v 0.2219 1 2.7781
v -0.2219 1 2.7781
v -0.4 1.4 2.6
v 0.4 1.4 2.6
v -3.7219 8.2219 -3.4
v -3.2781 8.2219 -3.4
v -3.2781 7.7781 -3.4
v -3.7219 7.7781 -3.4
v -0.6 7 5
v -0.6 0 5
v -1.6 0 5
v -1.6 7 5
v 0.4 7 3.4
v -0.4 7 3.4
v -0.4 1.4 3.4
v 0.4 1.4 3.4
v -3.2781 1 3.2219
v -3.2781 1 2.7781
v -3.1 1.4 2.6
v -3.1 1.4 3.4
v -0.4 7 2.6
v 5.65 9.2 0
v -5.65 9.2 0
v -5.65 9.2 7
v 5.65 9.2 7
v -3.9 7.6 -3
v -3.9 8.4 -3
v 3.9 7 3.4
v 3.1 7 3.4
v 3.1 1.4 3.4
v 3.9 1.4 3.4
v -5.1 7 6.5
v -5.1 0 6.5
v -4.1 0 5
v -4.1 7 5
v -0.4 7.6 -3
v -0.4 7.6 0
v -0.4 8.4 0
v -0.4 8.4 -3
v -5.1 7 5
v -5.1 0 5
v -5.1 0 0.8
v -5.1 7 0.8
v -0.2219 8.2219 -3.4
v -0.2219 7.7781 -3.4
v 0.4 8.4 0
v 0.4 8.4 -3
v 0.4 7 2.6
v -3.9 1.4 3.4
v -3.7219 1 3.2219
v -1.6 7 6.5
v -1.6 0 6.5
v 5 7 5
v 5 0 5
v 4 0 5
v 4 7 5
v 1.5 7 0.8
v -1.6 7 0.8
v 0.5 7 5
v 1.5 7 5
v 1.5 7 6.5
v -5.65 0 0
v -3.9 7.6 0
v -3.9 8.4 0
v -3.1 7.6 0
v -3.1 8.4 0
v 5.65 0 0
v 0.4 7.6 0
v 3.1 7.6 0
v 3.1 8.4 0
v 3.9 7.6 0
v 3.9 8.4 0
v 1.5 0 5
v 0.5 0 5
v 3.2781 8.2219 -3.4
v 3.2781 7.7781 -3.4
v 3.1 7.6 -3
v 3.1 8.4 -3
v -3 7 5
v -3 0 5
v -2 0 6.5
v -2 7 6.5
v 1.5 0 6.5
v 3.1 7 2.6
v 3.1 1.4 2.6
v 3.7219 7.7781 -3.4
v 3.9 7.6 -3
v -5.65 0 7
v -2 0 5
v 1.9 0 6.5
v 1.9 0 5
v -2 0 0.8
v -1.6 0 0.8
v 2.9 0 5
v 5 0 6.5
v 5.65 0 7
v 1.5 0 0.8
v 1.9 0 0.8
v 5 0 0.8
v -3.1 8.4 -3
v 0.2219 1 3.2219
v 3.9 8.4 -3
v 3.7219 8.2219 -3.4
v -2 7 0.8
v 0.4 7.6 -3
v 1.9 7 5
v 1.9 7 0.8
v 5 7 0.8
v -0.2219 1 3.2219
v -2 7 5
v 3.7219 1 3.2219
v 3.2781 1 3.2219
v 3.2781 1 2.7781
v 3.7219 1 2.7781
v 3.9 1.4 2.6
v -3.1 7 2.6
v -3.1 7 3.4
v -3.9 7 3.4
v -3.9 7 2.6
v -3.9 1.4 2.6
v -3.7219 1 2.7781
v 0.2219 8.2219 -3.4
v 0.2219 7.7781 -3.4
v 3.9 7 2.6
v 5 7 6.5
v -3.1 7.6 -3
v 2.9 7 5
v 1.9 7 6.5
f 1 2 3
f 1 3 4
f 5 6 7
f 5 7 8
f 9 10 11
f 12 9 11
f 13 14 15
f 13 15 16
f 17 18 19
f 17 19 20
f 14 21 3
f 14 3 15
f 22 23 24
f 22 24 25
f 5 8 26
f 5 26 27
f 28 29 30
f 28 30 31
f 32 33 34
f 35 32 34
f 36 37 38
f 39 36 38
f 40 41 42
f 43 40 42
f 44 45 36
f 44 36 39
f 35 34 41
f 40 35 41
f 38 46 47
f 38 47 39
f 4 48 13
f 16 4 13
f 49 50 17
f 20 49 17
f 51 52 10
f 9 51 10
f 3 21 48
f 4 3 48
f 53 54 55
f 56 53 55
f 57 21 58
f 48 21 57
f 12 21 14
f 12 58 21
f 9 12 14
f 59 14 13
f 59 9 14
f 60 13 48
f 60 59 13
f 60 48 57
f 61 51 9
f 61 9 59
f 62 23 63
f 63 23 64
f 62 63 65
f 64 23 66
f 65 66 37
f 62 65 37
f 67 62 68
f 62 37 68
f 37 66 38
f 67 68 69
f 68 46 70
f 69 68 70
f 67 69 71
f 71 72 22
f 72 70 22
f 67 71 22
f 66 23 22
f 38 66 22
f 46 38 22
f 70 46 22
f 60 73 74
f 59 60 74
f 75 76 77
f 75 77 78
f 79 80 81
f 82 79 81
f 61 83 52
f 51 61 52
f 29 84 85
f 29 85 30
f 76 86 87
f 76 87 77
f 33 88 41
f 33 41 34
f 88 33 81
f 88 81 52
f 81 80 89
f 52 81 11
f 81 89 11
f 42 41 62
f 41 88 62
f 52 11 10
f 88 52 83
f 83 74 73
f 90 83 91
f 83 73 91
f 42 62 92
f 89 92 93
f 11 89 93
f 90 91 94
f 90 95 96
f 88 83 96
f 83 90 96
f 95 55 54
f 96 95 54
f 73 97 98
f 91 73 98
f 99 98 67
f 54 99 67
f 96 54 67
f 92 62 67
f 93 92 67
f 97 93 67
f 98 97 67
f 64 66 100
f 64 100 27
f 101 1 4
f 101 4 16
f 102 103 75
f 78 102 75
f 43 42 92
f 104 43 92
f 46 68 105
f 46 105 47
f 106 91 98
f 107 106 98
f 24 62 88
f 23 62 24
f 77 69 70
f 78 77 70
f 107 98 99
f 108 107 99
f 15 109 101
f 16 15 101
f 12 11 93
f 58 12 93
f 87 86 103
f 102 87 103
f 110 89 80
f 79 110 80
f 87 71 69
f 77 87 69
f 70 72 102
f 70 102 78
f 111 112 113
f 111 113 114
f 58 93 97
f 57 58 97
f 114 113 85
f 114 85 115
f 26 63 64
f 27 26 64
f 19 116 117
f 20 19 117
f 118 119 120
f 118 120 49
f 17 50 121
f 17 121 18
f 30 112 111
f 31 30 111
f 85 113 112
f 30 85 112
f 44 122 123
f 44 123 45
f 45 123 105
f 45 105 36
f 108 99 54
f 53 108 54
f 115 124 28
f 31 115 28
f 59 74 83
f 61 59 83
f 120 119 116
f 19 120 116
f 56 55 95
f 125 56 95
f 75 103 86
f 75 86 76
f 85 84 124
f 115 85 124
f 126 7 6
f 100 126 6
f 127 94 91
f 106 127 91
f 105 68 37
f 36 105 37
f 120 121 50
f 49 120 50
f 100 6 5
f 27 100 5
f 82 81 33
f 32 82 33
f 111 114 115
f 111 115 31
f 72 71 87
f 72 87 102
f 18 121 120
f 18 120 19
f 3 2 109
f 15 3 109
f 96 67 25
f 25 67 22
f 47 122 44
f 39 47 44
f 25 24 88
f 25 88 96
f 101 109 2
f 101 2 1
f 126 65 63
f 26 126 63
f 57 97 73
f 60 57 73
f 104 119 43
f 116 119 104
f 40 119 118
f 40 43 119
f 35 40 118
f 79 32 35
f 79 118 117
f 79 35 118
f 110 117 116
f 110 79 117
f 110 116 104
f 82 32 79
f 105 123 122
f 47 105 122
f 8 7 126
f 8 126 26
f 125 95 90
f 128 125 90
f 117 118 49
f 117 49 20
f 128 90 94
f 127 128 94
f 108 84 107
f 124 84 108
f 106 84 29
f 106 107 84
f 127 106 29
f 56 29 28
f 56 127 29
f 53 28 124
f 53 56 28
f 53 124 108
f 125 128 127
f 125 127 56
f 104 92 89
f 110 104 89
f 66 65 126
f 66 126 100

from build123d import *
from OCP.BRepFilletAPI import BRepFilletAPI_MakeChamfer

# Parameters (mm, degrees)
SKETCH_1_W                          = 11.3
SKETCH_1_H                          = 9.2
EXTRUDE_1_DEPTH                     = 7
SKETCH_2_W                          = 0.8
SKETCH_2_H                          = 0.8
EXTRUDE_2_DEPTH                     = 3.4
CHAMFER_1_SIZE                      = 0.4
CHAMFER_1_SIZE2                     = 0.178091474
CUT_EXTRUDE_1_DEPTH                 = 7
PATTERN_LINEAR_1_COUNT              = 3
PATTERN_LINEAR_1_PITCH              = 3.5
CHAMFER_1_OF_PATTERN_LINEAR_1_SIZE  = 0.4
CHAMFER_1_OF_PATTERN_LINEAR_1_SIZE2 = 0.178091474
PATTERN_LINEAR_2_COUNT              = 3
PATTERN_LINEAR_2_PITCH              = 3.5
SKETCH_4_W                          = 0.8
SKETCH_4_H                          = 0.8
EXTRUDE_3_DEPTH                     = 6
CHAMFER_2_SIZE                      = 0.4
CHAMFER_2_SIZE2                     = 0.178091474
PATTERN_LINEAR_3_COUNT              = 3
PATTERN_LINEAR_3_PITCH              = 3.5
CHAMFER_2_OF_PATTERN_LINEAR_3_SIZE  = 0.4
CHAMFER_2_OF_PATTERN_LINEAR_3_SIZE2 = 0.178091474


with BuildPart() as part:
    # Эскиз1 → Бобышка-Вытянуть1 (new body)
    with BuildSketch(Plane.XY):
        with Locations((0, 4.6)):
            Rectangle(SKETCH_1_W, SKETCH_1_H)
    extrude(amount=EXTRUDE_1_DEPTH)

    # Эскиз2 → Бобышка-Вытянуть2 (add)
    with BuildSketch(Plane(origin=(0, 0, 0), x_dir=(-1, 0, 0), z_dir=(0, 0, -1))):
        with Locations((-3.5, 8)):
            Rectangle(SKETCH_2_W, SKETCH_2_H)
    extrude_2 = extrude(amount=EXTRUDE_2_DEPTH)

    # Фаска1: one chamfer whose edges measure the first distance from different faces: ONE call of the kernel's chamfer builder (chamfer() names one face for all edges)
    chamfer_1_edges_1 = [part.edges().sort_by_distance(p)[0] for p in [
        (3.1, 8, -3.4),
    ]]
    chamfer_1_side_1 = [part.faces().sort_by_distance(p)[0] for p in [
        (3.1, 8, -1.7),
    ]]
    chamfer_1_edges_2 = [part.edges().sort_by_distance(p)[0] for p in [
        (3.5, 8.4, -3.4),
    ]]
    chamfer_1_side_2 = [part.faces().sort_by_distance(p)[0] for p in [
        (3.5, 8.4, -1.7),
    ]]
    chamfer_1_edges_3 = [part.edges().sort_by_distance(p)[0] for p in [
        (3.9, 8, -3.4),
    ]]
    chamfer_1_side_3 = [part.faces().sort_by_distance(p)[0] for p in [
        (3.9, 8, -1.7),
    ]]
    chamfer_1_edges_4 = [part.edges().sort_by_distance(p)[0] for p in [
        (3.5, 7.6, -3.4),
    ]]
    chamfer_1_side_4 = [part.faces().sort_by_distance(p)[0] for p in [
        (3.5, 7.6, -1.7),
    ]]
    chamfer_1 = BRepFilletAPI_MakeChamfer(part.part.solid().wrapped)
    for e in chamfer_1_edges_1:
        chamfer_1.Add(CHAMFER_1_SIZE, CHAMFER_1_SIZE2, e.wrapped, chamfer_1_side_1[0].wrapped)  # the first distance lies on this face
    for e in chamfer_1_edges_2:
        chamfer_1.Add(CHAMFER_1_SIZE, CHAMFER_1_SIZE2, e.wrapped, chamfer_1_side_2[0].wrapped)  # the first distance lies on this face
    for e in chamfer_1_edges_3:
        chamfer_1.Add(CHAMFER_1_SIZE, CHAMFER_1_SIZE2, e.wrapped, chamfer_1_side_3[0].wrapped)  # the first distance lies on this face
    for e in chamfer_1_edges_4:
        chamfer_1.Add(CHAMFER_1_SIZE, CHAMFER_1_SIZE2, e.wrapped, chamfer_1_side_4[0].wrapped)  # the first distance lies on this face
    add(Compound.cast(chamfer_1.Shape()), mode=Mode.REPLACE)

    # Эскиз3 → Вырез-Вытянуть1 (cut)
    with BuildSketch(Plane.XZ):
        Polygon((1.9, 0.8), (5, 0.8), (5, 5), (4, 5), (5, 6.5), (1.9, 6.5), (2.9, 5), (1.9, 5), align=None)
    cut_extrude_1 = extrude(amount=-CUT_EXTRUDE_1_DEPTH, mode=Mode.SUBTRACT)

    # Линейный массив1: Бобышка-Вытянуть2 ×3
    with Locations(*[(-i * PATTERN_LINEAR_1_PITCH, 0, 0) for i in range(1, PATTERN_LINEAR_1_COUNT)]):
        add(extrude_2)

    # Фаска1 of Линейный массив1: one chamfer whose edges measure the first distance from different faces: ONE call of the kernel's chamfer builder (chamfer() names one face for all edges)
    chamfer_1_of_pattern_linear_1_edges_1 = [part.edges().sort_by_distance(p)[0] for p in [
        (-0.4, 8, -3.4),
    ]]
    chamfer_1_of_pattern_linear_1_side_1 = [part.faces().sort_by_distance(p)[0] for p in [
        (-0.4, 8, -1.7),
    ]]
    chamfer_1_of_pattern_linear_1_edges_2 = [part.edges().sort_by_distance(p)[0] for p in [
        (0, 8.4, -3.4),
    ]]
    chamfer_1_of_pattern_linear_1_side_2 = [part.faces().sort_by_distance(p)[0] for p in [
        (0, 8.4, -1.7),
    ]]
    chamfer_1_of_pattern_linear_1_edges_3 = [part.edges().sort_by_distance(p)[0] for p in [
        (0.4, 8, -3.4),
    ]]
    chamfer_1_of_pattern_linear_1_side_3 = [part.faces().sort_by_distance(p)[0] for p in [
        (0.4, 8, -1.7),
    ]]
    chamfer_1_of_pattern_linear_1_edges_4 = [part.edges().sort_by_distance(p)[0] for p in [
        (0, 7.6, -3.4),
    ]]
    chamfer_1_of_pattern_linear_1_side_4 = [part.faces().sort_by_distance(p)[0] for p in [
        (0, 7.6, -1.7),
    ]]
    chamfer_1_of_pattern_linear_1_edges_5 = [part.edges().sort_by_distance(p)[0] for p in [
        (-3.9, 8, -3.4),
    ]]
    chamfer_1_of_pattern_linear_1_side_5 = [part.faces().sort_by_distance(p)[0] for p in [
        (-3.9, 8, -1.7),
    ]]
    chamfer_1_of_pattern_linear_1_edges_6 = [part.edges().sort_by_distance(p)[0] for p in [
        (-3.5, 8.4, -3.4),
    ]]
    chamfer_1_of_pattern_linear_1_side_6 = [part.faces().sort_by_distance(p)[0] for p in [
        (-3.5, 8.4, -1.7),
    ]]
    chamfer_1_of_pattern_linear_1_edges_7 = [part.edges().sort_by_distance(p)[0] for p in [
        (-3.1, 8, -3.4),
    ]]
    chamfer_1_of_pattern_linear_1_side_7 = [part.faces().sort_by_distance(p)[0] for p in [
        (-3.1, 8, -1.7),
    ]]
    chamfer_1_of_pattern_linear_1_edges_8 = [part.edges().sort_by_distance(p)[0] for p in [
        (-3.5, 7.6, -3.4),
    ]]
    chamfer_1_of_pattern_linear_1_side_8 = [part.faces().sort_by_distance(p)[0] for p in [
        (-3.5, 7.6, -1.7),
    ]]
    chamfer_1_of_pattern_linear_1 = BRepFilletAPI_MakeChamfer(part.part.solid().wrapped)
    for e in chamfer_1_of_pattern_linear_1_edges_1:
        chamfer_1_of_pattern_linear_1.Add(CHAMFER_1_OF_PATTERN_LINEAR_1_SIZE, CHAMFER_1_OF_PATTERN_LINEAR_1_SIZE2, e.wrapped, chamfer_1_of_pattern_linear_1_side_1[0].wrapped)  # the first distance lies on this face
    for e in chamfer_1_of_pattern_linear_1_edges_2:
        chamfer_1_of_pattern_linear_1.Add(CHAMFER_1_OF_PATTERN_LINEAR_1_SIZE, CHAMFER_1_OF_PATTERN_LINEAR_1_SIZE2, e.wrapped, chamfer_1_of_pattern_linear_1_side_2[0].wrapped)  # the first distance lies on this face
    for e in chamfer_1_of_pattern_linear_1_edges_3:
        chamfer_1_of_pattern_linear_1.Add(CHAMFER_1_OF_PATTERN_LINEAR_1_SIZE, CHAMFER_1_OF_PATTERN_LINEAR_1_SIZE2, e.wrapped, chamfer_1_of_pattern_linear_1_side_3[0].wrapped)  # the first distance lies on this face
    for e in chamfer_1_of_pattern_linear_1_edges_4:
        chamfer_1_of_pattern_linear_1.Add(CHAMFER_1_OF_PATTERN_LINEAR_1_SIZE, CHAMFER_1_OF_PATTERN_LINEAR_1_SIZE2, e.wrapped, chamfer_1_of_pattern_linear_1_side_4[0].wrapped)  # the first distance lies on this face
    for e in chamfer_1_of_pattern_linear_1_edges_5:
        chamfer_1_of_pattern_linear_1.Add(CHAMFER_1_OF_PATTERN_LINEAR_1_SIZE, CHAMFER_1_OF_PATTERN_LINEAR_1_SIZE2, e.wrapped, chamfer_1_of_pattern_linear_1_side_5[0].wrapped)  # the first distance lies on this face
    for e in chamfer_1_of_pattern_linear_1_edges_6:
        chamfer_1_of_pattern_linear_1.Add(CHAMFER_1_OF_PATTERN_LINEAR_1_SIZE, CHAMFER_1_OF_PATTERN_LINEAR_1_SIZE2, e.wrapped, chamfer_1_of_pattern_linear_1_side_6[0].wrapped)  # the first distance lies on this face
    for e in chamfer_1_of_pattern_linear_1_edges_7:
        chamfer_1_of_pattern_linear_1.Add(CHAMFER_1_OF_PATTERN_LINEAR_1_SIZE, CHAMFER_1_OF_PATTERN_LINEAR_1_SIZE2, e.wrapped, chamfer_1_of_pattern_linear_1_side_7[0].wrapped)  # the first distance lies on this face
    for e in chamfer_1_of_pattern_linear_1_edges_8:
        chamfer_1_of_pattern_linear_1.Add(CHAMFER_1_OF_PATTERN_LINEAR_1_SIZE, CHAMFER_1_OF_PATTERN_LINEAR_1_SIZE2, e.wrapped, chamfer_1_of_pattern_linear_1_side_8[0].wrapped)  # the first distance lies on this face
    add(Compound.cast(chamfer_1_of_pattern_linear_1.Shape()), mode=Mode.REPLACE)

    # Линейный массив2: Вырез-Вытянуть1 ×3
    with Locations(*[(-i * PATTERN_LINEAR_2_PITCH, 0, 0) for i in range(1, PATTERN_LINEAR_2_COUNT)]):
        add(cut_extrude_1, mode=Mode.SUBTRACT)

    # Эскиз4 → Бобышка-Вытянуть3 (add)
    with BuildSketch(Plane.XZ.offset(-7)):
        with Locations((3.5, 3)):
            Rectangle(SKETCH_4_W, SKETCH_4_H)
    extrude_3 = extrude(amount=EXTRUDE_3_DEPTH)

    # Фаска2: one chamfer whose edges measure the first distance from different faces: ONE call of the kernel's chamfer builder (chamfer() names one face for all edges)
    chamfer_2_edges_1 = [part.edges().sort_by_distance(p)[0] for p in [
        (3.9, 1, 3),
    ]]
    chamfer_2_side_1 = [part.faces().sort_by_distance(p)[0] for p in [
        (3.9, 4, 3),
    ]]
    chamfer_2_edges_2 = [part.edges().sort_by_distance(p)[0] for p in [
        (3.5, 1, 3.4),
    ]]
    chamfer_2_side_2 = [part.faces().sort_by_distance(p)[0] for p in [
        (3.5, 4, 3.4),
    ]]
    chamfer_2_edges_3 = [part.edges().sort_by_distance(p)[0] for p in [
        (3.1, 1, 3),
    ]]
    chamfer_2_side_3 = [part.faces().sort_by_distance(p)[0] for p in [
        (3.1, 4, 3),
    ]]
    chamfer_2_edges_4 = [part.edges().sort_by_distance(p)[0] for p in [
        (3.5, 1, 2.6),
    ]]
    chamfer_2_side_4 = [part.faces().sort_by_distance(p)[0] for p in [
        (3.5, 4, 2.6),
    ]]
    chamfer_2 = BRepFilletAPI_MakeChamfer(part.part.solid().wrapped)
    for e in chamfer_2_edges_1:
        chamfer_2.Add(CHAMFER_2_SIZE, CHAMFER_2_SIZE2, e.wrapped, chamfer_2_side_1[0].wrapped)  # the first distance lies on this face
    for e in chamfer_2_edges_2:
        chamfer_2.Add(CHAMFER_2_SIZE, CHAMFER_2_SIZE2, e.wrapped, chamfer_2_side_2[0].wrapped)  # the first distance lies on this face
    for e in chamfer_2_edges_3:
        chamfer_2.Add(CHAMFER_2_SIZE, CHAMFER_2_SIZE2, e.wrapped, chamfer_2_side_3[0].wrapped)  # the first distance lies on this face
    for e in chamfer_2_edges_4:
        chamfer_2.Add(CHAMFER_2_SIZE, CHAMFER_2_SIZE2, e.wrapped, chamfer_2_side_4[0].wrapped)  # the first distance lies on this face
    add(Compound.cast(chamfer_2.Shape()), mode=Mode.REPLACE)

    # Линейный массив3: Бобышка-Вытянуть3 ×3
    with Locations(*[(-i * PATTERN_LINEAR_3_PITCH, 0, 0) for i in range(1, PATTERN_LINEAR_3_COUNT)]):
        add(extrude_3)

    # Фаска2 of Линейный массив3: one chamfer whose edges measure the first distance from different faces: ONE call of the kernel's chamfer builder (chamfer() names one face for all edges)
    chamfer_2_of_pattern_linear_3_edges_1 = [part.edges().sort_by_distance(p)[0] for p in [
        (0.4, 1, 3),
    ]]
    chamfer_2_of_pattern_linear_3_side_1 = [part.faces().sort_by_distance(p)[0] for p in [
        (0.4, 4, 3),
    ]]
    chamfer_2_of_pattern_linear_3_edges_2 = [part.edges().sort_by_distance(p)[0] for p in [
        (0, 1, 3.4),
    ]]
    chamfer_2_of_pattern_linear_3_side_2 = [part.faces().sort_by_distance(p)[0] for p in [
        (0, 4, 3.4),
    ]]
    chamfer_2_of_pattern_linear_3_edges_3 = [part.edges().sort_by_distance(p)[0] for p in [
        (-0.4, 1, 3),
    ]]
    chamfer_2_of_pattern_linear_3_side_3 = [part.faces().sort_by_distance(p)[0] for p in [
        (-0.4, 4, 3),
    ]]
    chamfer_2_of_pattern_linear_3_edges_4 = [part.edges().sort_by_distance(p)[0] for p in [
        (0, 1, 2.6),
    ]]
    chamfer_2_of_pattern_linear_3_side_4 = [part.faces().sort_by_distance(p)[0] for p in [
        (0, 4, 2.6),
    ]]
    chamfer_2_of_pattern_linear_3_edges_5 = [part.edges().sort_by_distance(p)[0] for p in [
        (-3.1, 1, 3),
    ]]
    chamfer_2_of_pattern_linear_3_side_5 = [part.faces().sort_by_distance(p)[0] for p in [
        (-3.1, 4, 3),
    ]]
    chamfer_2_of_pattern_linear_3_edges_6 = [part.edges().sort_by_distance(p)[0] for p in [
        (-3.5, 1, 3.4),
    ]]
    chamfer_2_of_pattern_linear_3_side_6 = [part.faces().sort_by_distance(p)[0] for p in [
        (-3.5, 4, 3.4),
    ]]
    chamfer_2_of_pattern_linear_3_edges_7 = [part.edges().sort_by_distance(p)[0] for p in [
        (-3.9, 1, 3),
    ]]
    chamfer_2_of_pattern_linear_3_side_7 = [part.faces().sort_by_distance(p)[0] for p in [
        (-3.9, 4, 3),
    ]]
    chamfer_2_of_pattern_linear_3_edges_8 = [part.edges().sort_by_distance(p)[0] for p in [
        (-3.5, 1, 2.6),
    ]]
    chamfer_2_of_pattern_linear_3_side_8 = [part.faces().sort_by_distance(p)[0] for p in [
        (-3.5, 4, 2.6),
    ]]
    chamfer_2_of_pattern_linear_3 = BRepFilletAPI_MakeChamfer(part.part.solid().wrapped)
    for e in chamfer_2_of_pattern_linear_3_edges_1:
        chamfer_2_of_pattern_linear_3.Add(CHAMFER_2_OF_PATTERN_LINEAR_3_SIZE, CHAMFER_2_OF_PATTERN_LINEAR_3_SIZE2, e.wrapped, chamfer_2_of_pattern_linear_3_side_1[0].wrapped)  # the first distance lies on this face
    for e in chamfer_2_of_pattern_linear_3_edges_2:
        chamfer_2_of_pattern_linear_3.Add(CHAMFER_2_OF_PATTERN_LINEAR_3_SIZE, CHAMFER_2_OF_PATTERN_LINEAR_3_SIZE2, e.wrapped, chamfer_2_of_pattern_linear_3_side_2[0].wrapped)  # the first distance lies on this face
    for e in chamfer_2_of_pattern_linear_3_edges_3:
        chamfer_2_of_pattern_linear_3.Add(CHAMFER_2_OF_PATTERN_LINEAR_3_SIZE, CHAMFER_2_OF_PATTERN_LINEAR_3_SIZE2, e.wrapped, chamfer_2_of_pattern_linear_3_side_3[0].wrapped)  # the first distance lies on this face
    for e in chamfer_2_of_pattern_linear_3_edges_4:
        chamfer_2_of_pattern_linear_3.Add(CHAMFER_2_OF_PATTERN_LINEAR_3_SIZE, CHAMFER_2_OF_PATTERN_LINEAR_3_SIZE2, e.wrapped, chamfer_2_of_pattern_linear_3_side_4[0].wrapped)  # the first distance lies on this face
    for e in chamfer_2_of_pattern_linear_3_edges_5:
        chamfer_2_of_pattern_linear_3.Add(CHAMFER_2_OF_PATTERN_LINEAR_3_SIZE, CHAMFER_2_OF_PATTERN_LINEAR_3_SIZE2, e.wrapped, chamfer_2_of_pattern_linear_3_side_5[0].wrapped)  # the first distance lies on this face
    for e in chamfer_2_of_pattern_linear_3_edges_6:
        chamfer_2_of_pattern_linear_3.Add(CHAMFER_2_OF_PATTERN_LINEAR_3_SIZE, CHAMFER_2_OF_PATTERN_LINEAR_3_SIZE2, e.wrapped, chamfer_2_of_pattern_linear_3_side_6[0].wrapped)  # the first distance lies on this face
    for e in chamfer_2_of_pattern_linear_3_edges_7:
        chamfer_2_of_pattern_linear_3.Add(CHAMFER_2_OF_PATTERN_LINEAR_3_SIZE, CHAMFER_2_OF_PATTERN_LINEAR_3_SIZE2, e.wrapped, chamfer_2_of_pattern_linear_3_side_7[0].wrapped)  # the first distance lies on this face
    for e in chamfer_2_of_pattern_linear_3_edges_8:
        chamfer_2_of_pattern_linear_3.Add(CHAMFER_2_OF_PATTERN_LINEAR_3_SIZE, CHAMFER_2_OF_PATTERN_LINEAR_3_SIZE2, e.wrapped, chamfer_2_of_pattern_linear_3_side_8[0].wrapped)  # the first distance lies on this face
    add(Compound.cast(chamfer_2_of_pattern_linear_3.Shape()), mode=Mode.REPLACE)


solid = part.part
